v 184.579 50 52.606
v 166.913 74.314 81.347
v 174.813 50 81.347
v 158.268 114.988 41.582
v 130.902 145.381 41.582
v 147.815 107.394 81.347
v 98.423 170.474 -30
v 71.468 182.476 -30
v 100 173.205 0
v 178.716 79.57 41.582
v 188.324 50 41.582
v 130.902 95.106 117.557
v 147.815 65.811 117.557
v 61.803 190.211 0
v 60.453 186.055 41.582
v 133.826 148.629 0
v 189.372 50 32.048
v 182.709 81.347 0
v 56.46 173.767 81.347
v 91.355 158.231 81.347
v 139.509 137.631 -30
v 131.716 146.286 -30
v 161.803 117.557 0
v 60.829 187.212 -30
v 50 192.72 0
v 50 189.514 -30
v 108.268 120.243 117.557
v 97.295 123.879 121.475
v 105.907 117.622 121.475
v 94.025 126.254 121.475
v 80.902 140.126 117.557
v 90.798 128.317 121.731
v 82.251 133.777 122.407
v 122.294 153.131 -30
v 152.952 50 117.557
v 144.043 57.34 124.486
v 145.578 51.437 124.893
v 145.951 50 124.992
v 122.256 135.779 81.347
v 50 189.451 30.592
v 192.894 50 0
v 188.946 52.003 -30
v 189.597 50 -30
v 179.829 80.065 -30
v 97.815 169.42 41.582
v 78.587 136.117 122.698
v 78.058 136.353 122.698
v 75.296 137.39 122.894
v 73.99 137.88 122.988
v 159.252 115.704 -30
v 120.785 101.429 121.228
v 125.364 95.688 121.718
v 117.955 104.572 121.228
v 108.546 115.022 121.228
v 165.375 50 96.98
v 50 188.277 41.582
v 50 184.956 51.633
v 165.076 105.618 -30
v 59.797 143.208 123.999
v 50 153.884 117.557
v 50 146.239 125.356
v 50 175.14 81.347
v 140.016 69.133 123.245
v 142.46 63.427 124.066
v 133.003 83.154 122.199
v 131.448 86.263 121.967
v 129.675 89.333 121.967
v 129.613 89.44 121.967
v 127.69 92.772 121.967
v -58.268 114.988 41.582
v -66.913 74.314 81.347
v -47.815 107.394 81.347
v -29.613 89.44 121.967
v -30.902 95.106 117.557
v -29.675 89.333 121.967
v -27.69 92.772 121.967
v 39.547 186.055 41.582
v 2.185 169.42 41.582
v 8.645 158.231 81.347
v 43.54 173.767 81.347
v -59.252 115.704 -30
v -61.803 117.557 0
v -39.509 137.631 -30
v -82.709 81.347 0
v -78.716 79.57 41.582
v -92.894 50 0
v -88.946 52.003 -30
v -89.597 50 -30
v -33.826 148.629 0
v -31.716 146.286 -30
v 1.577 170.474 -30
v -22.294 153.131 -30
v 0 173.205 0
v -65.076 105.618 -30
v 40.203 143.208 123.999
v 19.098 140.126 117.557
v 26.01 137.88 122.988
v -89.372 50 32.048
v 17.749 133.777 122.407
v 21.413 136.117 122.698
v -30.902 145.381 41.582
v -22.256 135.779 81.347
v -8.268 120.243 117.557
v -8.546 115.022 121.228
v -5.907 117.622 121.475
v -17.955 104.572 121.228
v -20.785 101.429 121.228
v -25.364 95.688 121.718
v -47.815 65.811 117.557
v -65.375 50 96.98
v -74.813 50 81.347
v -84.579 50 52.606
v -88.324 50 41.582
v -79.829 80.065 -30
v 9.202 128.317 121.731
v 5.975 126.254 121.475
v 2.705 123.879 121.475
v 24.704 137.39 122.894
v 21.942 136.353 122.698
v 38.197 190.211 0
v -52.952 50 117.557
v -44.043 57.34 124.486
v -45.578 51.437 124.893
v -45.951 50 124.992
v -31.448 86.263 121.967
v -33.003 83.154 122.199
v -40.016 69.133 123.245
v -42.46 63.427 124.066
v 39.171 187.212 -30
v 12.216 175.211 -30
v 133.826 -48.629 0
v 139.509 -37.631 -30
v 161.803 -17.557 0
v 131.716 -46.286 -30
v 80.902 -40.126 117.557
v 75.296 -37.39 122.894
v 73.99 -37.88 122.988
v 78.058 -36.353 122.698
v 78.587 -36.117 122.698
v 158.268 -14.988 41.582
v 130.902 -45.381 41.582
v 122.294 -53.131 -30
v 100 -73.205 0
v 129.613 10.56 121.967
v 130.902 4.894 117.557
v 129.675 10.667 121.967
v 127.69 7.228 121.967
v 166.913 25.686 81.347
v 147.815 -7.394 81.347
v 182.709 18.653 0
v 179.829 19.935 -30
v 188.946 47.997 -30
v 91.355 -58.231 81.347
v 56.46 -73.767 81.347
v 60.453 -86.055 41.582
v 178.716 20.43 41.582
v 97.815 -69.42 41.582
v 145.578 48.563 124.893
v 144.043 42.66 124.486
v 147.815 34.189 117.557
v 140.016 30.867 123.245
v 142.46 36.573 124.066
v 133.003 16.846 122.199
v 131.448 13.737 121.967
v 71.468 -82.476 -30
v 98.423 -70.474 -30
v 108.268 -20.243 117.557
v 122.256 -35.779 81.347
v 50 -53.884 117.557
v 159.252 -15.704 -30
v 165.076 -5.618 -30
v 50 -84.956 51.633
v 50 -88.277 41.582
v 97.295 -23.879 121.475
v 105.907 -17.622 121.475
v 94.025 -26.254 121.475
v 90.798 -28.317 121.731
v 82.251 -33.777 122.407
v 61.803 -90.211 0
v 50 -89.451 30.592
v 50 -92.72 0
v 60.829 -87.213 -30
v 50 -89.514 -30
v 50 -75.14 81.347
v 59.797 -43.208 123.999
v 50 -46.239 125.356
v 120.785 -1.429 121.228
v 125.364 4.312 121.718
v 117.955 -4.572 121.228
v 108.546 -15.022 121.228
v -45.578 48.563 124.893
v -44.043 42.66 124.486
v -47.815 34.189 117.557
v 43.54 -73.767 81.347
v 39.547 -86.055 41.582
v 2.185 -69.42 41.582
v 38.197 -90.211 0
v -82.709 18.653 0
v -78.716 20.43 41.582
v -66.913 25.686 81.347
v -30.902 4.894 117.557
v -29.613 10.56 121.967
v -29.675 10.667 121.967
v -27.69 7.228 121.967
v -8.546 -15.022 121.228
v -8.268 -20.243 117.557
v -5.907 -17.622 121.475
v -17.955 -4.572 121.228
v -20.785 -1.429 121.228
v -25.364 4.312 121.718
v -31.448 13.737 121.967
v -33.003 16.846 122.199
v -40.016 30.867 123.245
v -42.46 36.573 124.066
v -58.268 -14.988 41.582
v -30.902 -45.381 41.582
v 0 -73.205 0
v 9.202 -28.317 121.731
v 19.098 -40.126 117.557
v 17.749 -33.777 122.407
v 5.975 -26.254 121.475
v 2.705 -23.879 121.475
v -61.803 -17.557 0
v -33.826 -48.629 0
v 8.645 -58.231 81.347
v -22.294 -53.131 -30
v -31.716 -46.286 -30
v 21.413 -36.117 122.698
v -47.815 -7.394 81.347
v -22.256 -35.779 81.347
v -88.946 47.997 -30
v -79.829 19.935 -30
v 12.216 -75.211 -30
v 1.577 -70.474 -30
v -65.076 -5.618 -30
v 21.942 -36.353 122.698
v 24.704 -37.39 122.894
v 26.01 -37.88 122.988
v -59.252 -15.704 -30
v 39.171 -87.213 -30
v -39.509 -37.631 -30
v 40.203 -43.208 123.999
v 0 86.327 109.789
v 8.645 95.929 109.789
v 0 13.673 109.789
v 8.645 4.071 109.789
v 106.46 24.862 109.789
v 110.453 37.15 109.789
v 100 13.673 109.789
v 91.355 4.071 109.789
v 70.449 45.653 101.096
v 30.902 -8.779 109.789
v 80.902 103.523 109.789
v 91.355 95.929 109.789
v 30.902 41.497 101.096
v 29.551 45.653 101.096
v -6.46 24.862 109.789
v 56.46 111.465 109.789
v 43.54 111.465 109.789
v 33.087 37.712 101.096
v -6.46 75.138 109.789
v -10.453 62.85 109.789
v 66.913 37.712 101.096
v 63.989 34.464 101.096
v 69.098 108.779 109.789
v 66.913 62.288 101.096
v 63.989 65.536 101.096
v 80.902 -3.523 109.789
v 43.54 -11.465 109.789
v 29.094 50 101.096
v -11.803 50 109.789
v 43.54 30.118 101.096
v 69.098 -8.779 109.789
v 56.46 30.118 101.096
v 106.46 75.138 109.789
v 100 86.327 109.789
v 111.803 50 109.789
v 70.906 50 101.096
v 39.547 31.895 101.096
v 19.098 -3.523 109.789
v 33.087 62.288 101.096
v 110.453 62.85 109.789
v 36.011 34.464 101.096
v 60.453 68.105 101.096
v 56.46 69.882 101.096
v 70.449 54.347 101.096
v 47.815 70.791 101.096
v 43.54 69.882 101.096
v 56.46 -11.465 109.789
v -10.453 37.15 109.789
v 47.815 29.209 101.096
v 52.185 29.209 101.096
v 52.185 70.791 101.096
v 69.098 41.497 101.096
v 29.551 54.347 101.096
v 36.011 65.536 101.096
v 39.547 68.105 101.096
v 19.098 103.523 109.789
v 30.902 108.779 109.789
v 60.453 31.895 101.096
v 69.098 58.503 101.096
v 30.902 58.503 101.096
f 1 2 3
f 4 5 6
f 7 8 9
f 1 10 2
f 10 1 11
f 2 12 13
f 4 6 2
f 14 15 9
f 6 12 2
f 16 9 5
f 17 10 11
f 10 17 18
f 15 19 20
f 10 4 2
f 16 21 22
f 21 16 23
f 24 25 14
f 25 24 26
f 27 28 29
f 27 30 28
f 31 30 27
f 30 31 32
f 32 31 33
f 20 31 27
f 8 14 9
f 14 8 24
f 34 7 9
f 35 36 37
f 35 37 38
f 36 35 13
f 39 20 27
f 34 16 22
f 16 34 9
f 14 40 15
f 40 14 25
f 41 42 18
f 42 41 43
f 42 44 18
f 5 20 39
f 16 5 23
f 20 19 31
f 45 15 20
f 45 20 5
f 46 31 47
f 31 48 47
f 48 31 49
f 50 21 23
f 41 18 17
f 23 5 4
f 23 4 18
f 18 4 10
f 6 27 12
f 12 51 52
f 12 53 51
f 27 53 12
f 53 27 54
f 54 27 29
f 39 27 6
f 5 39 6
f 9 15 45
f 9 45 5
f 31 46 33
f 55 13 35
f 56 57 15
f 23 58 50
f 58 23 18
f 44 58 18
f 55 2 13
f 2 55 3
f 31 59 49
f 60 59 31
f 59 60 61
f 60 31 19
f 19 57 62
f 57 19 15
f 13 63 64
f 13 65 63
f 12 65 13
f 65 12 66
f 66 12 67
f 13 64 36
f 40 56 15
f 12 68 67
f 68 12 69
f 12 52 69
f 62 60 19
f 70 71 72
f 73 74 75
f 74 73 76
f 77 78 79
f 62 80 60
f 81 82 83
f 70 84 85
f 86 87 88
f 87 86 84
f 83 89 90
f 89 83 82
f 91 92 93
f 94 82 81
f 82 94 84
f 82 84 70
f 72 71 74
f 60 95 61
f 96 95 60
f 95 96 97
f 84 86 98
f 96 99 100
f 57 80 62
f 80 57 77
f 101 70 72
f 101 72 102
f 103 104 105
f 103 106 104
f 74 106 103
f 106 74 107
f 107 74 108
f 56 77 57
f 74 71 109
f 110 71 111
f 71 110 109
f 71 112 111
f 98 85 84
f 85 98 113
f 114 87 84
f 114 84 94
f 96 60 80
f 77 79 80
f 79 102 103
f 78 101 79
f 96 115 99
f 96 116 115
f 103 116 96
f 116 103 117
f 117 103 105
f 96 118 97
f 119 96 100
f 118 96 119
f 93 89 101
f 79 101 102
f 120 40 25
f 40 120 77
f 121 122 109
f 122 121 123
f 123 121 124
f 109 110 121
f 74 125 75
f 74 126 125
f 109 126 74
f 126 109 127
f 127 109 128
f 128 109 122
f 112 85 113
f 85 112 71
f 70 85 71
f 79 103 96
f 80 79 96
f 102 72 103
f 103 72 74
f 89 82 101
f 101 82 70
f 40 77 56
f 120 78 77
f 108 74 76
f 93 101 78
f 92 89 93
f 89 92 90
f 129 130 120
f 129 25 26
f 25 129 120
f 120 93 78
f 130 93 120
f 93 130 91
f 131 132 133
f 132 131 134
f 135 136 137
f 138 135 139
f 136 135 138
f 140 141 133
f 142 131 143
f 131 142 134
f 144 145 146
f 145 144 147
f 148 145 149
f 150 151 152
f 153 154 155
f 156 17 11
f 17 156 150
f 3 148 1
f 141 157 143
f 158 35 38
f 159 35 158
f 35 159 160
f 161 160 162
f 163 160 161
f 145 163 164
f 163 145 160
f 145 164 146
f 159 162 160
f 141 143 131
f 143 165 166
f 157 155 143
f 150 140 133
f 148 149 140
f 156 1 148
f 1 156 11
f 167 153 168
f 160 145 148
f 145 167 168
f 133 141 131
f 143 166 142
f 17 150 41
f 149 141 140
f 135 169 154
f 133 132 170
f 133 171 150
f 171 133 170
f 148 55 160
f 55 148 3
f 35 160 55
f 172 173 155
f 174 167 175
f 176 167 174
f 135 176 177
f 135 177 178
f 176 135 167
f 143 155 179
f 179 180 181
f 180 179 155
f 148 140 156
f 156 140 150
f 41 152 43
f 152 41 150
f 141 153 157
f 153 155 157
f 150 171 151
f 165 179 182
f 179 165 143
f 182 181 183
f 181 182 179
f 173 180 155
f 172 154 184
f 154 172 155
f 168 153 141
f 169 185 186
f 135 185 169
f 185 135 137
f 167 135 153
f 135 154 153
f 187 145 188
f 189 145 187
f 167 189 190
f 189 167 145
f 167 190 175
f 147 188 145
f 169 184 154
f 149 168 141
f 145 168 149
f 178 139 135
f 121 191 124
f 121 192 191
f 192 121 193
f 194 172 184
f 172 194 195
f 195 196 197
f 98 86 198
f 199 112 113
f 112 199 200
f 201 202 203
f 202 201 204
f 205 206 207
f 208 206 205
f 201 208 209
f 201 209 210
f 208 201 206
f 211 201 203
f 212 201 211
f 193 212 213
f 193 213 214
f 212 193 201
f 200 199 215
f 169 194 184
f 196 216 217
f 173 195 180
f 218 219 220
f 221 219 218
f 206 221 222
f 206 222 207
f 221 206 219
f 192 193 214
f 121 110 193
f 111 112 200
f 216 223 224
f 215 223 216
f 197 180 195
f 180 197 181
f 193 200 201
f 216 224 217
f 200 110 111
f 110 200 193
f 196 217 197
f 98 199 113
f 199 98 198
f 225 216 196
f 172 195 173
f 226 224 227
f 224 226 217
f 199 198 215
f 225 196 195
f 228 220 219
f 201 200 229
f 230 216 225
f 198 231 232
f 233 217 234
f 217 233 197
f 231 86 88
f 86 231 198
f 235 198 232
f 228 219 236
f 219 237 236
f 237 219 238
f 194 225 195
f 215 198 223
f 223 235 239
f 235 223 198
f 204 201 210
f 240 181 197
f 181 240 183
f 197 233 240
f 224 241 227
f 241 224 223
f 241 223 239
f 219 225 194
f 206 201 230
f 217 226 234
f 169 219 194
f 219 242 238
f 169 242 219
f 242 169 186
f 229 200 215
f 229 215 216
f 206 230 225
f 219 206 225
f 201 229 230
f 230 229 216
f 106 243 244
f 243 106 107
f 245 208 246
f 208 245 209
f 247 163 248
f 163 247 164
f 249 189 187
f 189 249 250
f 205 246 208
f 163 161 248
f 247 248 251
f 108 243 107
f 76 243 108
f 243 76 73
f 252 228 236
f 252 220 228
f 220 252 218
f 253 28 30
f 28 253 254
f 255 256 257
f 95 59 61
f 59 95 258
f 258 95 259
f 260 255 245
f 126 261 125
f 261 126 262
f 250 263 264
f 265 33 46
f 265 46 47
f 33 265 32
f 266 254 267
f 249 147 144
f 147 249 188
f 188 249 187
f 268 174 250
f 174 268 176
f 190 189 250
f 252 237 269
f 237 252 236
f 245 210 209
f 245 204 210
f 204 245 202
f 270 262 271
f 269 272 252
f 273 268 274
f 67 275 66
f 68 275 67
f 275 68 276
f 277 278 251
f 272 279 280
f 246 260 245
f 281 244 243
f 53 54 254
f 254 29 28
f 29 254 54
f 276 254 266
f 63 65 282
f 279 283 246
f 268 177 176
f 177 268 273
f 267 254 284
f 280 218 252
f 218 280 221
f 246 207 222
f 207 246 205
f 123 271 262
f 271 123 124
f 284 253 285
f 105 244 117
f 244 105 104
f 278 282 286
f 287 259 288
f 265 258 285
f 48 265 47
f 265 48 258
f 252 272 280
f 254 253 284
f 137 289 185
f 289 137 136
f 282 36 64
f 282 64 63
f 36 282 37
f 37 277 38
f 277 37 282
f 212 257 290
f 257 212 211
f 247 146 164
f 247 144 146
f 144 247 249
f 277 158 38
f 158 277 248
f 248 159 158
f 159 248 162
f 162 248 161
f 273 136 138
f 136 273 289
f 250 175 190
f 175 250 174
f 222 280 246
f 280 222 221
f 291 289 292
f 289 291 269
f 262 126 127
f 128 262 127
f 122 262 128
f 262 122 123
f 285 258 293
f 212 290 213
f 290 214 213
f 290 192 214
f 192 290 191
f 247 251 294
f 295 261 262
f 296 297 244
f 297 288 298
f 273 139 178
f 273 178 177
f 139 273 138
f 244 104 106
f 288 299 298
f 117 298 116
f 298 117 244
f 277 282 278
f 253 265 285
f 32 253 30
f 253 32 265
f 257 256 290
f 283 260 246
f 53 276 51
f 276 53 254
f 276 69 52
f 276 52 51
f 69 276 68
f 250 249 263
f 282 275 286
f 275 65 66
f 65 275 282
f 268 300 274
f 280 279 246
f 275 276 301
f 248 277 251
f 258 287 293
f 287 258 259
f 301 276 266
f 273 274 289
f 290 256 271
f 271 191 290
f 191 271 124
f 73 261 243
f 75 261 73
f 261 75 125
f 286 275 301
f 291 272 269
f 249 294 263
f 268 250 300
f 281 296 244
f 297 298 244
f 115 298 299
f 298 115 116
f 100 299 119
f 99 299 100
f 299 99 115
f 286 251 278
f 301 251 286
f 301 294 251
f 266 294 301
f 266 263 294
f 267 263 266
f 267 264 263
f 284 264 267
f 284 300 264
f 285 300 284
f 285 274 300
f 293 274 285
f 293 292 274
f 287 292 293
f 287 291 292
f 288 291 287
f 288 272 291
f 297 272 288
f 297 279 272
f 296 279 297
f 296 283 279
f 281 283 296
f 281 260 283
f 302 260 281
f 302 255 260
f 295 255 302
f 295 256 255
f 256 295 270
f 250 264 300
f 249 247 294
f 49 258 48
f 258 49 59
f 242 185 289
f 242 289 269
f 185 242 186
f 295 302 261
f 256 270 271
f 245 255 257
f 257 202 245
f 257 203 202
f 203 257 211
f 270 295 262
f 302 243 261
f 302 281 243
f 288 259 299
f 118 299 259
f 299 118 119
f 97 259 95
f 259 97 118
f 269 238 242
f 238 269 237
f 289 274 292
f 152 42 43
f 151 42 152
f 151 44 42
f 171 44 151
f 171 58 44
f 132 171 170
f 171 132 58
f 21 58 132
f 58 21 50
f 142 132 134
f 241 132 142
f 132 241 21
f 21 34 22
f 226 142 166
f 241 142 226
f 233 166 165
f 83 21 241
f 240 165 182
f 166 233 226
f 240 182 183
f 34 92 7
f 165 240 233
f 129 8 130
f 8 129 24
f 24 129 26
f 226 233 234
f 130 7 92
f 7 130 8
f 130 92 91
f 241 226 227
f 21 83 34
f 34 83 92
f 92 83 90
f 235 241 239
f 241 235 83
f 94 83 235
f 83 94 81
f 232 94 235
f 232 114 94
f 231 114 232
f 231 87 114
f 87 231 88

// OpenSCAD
difference() {
    intersection() {
    sphere(r = 200);
    translate([100,0,0]) sphere(r = 200);
    translate([0,100,0]) sphere(r = 200);
    translate([100,100,0]) sphere(r = 200);
    }
    translate([50,50,300])  sphere(r = 200);
    translate([-100,-100,-330]) cube(300);
}

echo(version=version());
